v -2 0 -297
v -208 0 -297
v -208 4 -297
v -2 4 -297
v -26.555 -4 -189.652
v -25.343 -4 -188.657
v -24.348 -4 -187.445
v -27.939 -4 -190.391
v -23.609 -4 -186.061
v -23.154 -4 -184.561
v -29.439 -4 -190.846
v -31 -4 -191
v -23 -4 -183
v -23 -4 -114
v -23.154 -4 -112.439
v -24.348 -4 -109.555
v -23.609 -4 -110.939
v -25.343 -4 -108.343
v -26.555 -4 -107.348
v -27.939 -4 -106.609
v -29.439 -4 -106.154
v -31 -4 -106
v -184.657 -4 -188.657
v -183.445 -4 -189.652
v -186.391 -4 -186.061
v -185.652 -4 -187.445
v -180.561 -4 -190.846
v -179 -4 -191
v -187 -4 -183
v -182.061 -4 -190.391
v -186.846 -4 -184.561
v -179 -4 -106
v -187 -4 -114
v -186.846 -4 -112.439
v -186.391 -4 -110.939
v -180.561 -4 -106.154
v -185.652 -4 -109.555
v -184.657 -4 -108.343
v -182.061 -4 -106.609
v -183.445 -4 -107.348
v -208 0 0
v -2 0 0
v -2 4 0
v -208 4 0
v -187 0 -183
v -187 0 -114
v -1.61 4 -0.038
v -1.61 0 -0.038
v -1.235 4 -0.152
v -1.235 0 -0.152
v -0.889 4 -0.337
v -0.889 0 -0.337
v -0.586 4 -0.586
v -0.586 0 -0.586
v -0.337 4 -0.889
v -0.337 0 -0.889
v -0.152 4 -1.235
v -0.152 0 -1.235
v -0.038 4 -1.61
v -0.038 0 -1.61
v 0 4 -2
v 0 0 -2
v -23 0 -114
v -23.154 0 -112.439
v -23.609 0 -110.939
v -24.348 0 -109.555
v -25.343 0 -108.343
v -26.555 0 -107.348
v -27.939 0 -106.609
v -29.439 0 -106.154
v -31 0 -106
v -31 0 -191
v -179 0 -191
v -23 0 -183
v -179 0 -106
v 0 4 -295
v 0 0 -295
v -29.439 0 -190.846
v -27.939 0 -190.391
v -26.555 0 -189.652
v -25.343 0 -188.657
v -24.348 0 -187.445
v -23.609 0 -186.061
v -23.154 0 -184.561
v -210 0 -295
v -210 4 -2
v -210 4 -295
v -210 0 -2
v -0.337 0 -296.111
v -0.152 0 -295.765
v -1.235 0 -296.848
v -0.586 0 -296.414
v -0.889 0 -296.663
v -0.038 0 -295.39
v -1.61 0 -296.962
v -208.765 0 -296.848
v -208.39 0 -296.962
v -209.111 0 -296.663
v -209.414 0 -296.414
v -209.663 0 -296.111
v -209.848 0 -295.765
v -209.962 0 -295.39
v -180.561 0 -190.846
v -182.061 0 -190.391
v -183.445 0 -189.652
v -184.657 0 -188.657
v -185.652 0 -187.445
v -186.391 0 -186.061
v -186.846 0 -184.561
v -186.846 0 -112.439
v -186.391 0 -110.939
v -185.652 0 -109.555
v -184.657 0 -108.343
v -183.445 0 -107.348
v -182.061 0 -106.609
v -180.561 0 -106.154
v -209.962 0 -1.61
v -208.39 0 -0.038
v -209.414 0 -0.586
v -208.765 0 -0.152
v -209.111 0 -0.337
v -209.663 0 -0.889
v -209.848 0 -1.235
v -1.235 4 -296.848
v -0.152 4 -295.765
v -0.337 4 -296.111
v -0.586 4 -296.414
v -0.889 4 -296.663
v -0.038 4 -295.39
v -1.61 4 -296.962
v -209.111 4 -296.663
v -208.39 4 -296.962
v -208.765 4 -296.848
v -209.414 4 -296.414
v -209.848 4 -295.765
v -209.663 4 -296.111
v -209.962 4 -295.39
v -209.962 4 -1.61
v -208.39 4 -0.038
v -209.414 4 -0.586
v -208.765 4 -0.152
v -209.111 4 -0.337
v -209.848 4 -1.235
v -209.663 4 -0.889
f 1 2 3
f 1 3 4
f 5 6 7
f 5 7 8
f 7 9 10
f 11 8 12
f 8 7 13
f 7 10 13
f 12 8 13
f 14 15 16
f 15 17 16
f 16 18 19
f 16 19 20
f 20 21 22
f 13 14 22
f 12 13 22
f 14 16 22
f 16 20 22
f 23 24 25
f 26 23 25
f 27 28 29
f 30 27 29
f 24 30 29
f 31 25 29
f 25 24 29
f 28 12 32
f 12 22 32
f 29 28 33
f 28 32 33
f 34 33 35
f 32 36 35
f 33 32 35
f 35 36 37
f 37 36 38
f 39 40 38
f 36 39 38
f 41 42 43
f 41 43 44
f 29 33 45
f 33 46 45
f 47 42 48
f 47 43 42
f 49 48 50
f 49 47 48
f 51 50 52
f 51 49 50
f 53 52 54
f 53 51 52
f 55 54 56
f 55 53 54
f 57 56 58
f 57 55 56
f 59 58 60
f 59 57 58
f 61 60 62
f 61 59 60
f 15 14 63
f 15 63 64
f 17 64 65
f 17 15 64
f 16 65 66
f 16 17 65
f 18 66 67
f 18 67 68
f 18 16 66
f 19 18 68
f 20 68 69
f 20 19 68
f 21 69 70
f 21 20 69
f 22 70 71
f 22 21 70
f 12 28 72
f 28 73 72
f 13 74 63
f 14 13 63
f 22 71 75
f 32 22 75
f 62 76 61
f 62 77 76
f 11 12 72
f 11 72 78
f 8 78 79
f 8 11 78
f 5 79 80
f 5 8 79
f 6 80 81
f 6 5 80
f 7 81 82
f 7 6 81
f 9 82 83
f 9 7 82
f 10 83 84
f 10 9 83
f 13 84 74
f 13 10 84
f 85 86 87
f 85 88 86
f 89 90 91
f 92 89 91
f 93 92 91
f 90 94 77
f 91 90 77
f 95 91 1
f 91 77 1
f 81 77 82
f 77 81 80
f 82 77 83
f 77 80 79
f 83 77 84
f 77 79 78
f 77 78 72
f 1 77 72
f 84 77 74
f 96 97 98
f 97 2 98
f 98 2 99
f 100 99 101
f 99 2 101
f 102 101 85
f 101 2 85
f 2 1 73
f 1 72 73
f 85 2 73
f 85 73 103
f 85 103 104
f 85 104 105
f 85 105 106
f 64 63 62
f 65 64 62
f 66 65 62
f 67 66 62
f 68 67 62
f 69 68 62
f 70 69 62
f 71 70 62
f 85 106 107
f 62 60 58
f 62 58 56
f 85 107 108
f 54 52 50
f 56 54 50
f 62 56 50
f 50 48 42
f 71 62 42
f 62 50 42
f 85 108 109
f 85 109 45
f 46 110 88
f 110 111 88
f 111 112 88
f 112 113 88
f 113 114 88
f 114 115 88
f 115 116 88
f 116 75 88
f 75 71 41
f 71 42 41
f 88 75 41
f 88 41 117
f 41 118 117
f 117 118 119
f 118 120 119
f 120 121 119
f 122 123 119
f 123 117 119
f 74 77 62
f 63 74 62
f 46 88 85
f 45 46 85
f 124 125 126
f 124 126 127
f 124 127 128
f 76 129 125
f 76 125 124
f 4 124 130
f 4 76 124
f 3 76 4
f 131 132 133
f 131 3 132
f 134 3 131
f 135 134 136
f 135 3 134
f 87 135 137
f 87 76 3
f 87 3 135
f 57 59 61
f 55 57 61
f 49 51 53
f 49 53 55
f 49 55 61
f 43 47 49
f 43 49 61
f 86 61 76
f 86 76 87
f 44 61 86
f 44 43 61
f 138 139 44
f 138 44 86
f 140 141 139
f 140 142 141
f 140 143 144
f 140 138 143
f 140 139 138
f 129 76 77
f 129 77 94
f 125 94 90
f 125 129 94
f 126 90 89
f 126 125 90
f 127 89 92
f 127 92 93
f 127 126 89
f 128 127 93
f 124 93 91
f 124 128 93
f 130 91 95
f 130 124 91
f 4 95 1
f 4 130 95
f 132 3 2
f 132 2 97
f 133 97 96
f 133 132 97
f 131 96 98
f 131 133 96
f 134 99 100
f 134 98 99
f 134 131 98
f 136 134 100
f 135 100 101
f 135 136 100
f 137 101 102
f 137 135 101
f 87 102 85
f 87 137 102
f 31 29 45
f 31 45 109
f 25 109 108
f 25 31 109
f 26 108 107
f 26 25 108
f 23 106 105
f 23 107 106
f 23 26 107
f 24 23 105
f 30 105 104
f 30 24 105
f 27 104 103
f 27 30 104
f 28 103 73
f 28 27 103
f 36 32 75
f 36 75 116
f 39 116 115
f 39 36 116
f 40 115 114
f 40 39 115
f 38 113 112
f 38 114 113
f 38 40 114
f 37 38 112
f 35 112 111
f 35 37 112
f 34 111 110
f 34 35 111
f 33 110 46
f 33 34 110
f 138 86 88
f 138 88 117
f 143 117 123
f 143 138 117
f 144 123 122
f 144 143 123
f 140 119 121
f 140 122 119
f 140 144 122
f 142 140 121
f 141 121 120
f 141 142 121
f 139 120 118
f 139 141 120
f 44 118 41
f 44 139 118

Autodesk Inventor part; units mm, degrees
ref_plane "YZ Plane" through (0, 0, 0) normal (1, 0, 0) x (0, 1, 0)
ref_plane "XZ Plane" through (0, 0, 0) normal (0, 1, 0) x (-1, 0, 0)
ref_plane "XY Plane" through (0, 0, 0) normal (0, 0, 1) x (1, 0, 0)
sketch "Sketch1" plane through (0, 0, 0) normal (0, 1, 0) x (-1, 0, 0)
  line L0 (0, 0) -> (210, 0)
  line L1 (210, 0) -> (210, -297)
  line L2 (210, -297) -> (0, -297)
  line L3 (0, -297) -> (0, 0)
  line L4 (23, -106) -> (187, -106)
  line L5 (187, -106) -> (187, -191)
  line L6 (187, -191) -> (23, -191)
  line L7 (23, -191) -> (23, -106)
  dimension "d30" = 210
  dimension "d31" = 297
  dimension "d34" = 164
  dimension "d35" = 85
  dimension "d42" = 106
  dimension "d43" = 23
extrude "Extrusion6" add sketch "Sketch1" against normal blind 4 contours L4 L5 L6 L7
extrude "Extrusion7" add sketch "Sketch1" along normal blind 4 contours L0 L1 L2 L3 | L4 L5 L6 L7
fillet "Fillet3" radius 2 4 edges at (0, 2, 0) (-210, 2, 0) (-210, 2, -297) (0, 2, -297)
fillet "Fillet4" radius 8 4 edges at (-187, -2, -191) (-187, -2, -106) (-23, -2, -106) (-23, -2, -191)
sketch "Sketch3" plane through (0, 4, 0) normal (0, 1, 0) x (1, 0, 0)
  line L0 (-210, 295) -> (-210, 2) projected
  line L1 (-210, 148.5) -> (0, 148.5)
  line L2 (0, 2) -> (0, 295) projected
  line L3 (-208, 0) -> (-2, 0) projected
  line L4 (-105, 0) -> (-105, 297)
  line L5 (-2, 297) -> (-208, 297) projected
  point P0 (0, 0)
